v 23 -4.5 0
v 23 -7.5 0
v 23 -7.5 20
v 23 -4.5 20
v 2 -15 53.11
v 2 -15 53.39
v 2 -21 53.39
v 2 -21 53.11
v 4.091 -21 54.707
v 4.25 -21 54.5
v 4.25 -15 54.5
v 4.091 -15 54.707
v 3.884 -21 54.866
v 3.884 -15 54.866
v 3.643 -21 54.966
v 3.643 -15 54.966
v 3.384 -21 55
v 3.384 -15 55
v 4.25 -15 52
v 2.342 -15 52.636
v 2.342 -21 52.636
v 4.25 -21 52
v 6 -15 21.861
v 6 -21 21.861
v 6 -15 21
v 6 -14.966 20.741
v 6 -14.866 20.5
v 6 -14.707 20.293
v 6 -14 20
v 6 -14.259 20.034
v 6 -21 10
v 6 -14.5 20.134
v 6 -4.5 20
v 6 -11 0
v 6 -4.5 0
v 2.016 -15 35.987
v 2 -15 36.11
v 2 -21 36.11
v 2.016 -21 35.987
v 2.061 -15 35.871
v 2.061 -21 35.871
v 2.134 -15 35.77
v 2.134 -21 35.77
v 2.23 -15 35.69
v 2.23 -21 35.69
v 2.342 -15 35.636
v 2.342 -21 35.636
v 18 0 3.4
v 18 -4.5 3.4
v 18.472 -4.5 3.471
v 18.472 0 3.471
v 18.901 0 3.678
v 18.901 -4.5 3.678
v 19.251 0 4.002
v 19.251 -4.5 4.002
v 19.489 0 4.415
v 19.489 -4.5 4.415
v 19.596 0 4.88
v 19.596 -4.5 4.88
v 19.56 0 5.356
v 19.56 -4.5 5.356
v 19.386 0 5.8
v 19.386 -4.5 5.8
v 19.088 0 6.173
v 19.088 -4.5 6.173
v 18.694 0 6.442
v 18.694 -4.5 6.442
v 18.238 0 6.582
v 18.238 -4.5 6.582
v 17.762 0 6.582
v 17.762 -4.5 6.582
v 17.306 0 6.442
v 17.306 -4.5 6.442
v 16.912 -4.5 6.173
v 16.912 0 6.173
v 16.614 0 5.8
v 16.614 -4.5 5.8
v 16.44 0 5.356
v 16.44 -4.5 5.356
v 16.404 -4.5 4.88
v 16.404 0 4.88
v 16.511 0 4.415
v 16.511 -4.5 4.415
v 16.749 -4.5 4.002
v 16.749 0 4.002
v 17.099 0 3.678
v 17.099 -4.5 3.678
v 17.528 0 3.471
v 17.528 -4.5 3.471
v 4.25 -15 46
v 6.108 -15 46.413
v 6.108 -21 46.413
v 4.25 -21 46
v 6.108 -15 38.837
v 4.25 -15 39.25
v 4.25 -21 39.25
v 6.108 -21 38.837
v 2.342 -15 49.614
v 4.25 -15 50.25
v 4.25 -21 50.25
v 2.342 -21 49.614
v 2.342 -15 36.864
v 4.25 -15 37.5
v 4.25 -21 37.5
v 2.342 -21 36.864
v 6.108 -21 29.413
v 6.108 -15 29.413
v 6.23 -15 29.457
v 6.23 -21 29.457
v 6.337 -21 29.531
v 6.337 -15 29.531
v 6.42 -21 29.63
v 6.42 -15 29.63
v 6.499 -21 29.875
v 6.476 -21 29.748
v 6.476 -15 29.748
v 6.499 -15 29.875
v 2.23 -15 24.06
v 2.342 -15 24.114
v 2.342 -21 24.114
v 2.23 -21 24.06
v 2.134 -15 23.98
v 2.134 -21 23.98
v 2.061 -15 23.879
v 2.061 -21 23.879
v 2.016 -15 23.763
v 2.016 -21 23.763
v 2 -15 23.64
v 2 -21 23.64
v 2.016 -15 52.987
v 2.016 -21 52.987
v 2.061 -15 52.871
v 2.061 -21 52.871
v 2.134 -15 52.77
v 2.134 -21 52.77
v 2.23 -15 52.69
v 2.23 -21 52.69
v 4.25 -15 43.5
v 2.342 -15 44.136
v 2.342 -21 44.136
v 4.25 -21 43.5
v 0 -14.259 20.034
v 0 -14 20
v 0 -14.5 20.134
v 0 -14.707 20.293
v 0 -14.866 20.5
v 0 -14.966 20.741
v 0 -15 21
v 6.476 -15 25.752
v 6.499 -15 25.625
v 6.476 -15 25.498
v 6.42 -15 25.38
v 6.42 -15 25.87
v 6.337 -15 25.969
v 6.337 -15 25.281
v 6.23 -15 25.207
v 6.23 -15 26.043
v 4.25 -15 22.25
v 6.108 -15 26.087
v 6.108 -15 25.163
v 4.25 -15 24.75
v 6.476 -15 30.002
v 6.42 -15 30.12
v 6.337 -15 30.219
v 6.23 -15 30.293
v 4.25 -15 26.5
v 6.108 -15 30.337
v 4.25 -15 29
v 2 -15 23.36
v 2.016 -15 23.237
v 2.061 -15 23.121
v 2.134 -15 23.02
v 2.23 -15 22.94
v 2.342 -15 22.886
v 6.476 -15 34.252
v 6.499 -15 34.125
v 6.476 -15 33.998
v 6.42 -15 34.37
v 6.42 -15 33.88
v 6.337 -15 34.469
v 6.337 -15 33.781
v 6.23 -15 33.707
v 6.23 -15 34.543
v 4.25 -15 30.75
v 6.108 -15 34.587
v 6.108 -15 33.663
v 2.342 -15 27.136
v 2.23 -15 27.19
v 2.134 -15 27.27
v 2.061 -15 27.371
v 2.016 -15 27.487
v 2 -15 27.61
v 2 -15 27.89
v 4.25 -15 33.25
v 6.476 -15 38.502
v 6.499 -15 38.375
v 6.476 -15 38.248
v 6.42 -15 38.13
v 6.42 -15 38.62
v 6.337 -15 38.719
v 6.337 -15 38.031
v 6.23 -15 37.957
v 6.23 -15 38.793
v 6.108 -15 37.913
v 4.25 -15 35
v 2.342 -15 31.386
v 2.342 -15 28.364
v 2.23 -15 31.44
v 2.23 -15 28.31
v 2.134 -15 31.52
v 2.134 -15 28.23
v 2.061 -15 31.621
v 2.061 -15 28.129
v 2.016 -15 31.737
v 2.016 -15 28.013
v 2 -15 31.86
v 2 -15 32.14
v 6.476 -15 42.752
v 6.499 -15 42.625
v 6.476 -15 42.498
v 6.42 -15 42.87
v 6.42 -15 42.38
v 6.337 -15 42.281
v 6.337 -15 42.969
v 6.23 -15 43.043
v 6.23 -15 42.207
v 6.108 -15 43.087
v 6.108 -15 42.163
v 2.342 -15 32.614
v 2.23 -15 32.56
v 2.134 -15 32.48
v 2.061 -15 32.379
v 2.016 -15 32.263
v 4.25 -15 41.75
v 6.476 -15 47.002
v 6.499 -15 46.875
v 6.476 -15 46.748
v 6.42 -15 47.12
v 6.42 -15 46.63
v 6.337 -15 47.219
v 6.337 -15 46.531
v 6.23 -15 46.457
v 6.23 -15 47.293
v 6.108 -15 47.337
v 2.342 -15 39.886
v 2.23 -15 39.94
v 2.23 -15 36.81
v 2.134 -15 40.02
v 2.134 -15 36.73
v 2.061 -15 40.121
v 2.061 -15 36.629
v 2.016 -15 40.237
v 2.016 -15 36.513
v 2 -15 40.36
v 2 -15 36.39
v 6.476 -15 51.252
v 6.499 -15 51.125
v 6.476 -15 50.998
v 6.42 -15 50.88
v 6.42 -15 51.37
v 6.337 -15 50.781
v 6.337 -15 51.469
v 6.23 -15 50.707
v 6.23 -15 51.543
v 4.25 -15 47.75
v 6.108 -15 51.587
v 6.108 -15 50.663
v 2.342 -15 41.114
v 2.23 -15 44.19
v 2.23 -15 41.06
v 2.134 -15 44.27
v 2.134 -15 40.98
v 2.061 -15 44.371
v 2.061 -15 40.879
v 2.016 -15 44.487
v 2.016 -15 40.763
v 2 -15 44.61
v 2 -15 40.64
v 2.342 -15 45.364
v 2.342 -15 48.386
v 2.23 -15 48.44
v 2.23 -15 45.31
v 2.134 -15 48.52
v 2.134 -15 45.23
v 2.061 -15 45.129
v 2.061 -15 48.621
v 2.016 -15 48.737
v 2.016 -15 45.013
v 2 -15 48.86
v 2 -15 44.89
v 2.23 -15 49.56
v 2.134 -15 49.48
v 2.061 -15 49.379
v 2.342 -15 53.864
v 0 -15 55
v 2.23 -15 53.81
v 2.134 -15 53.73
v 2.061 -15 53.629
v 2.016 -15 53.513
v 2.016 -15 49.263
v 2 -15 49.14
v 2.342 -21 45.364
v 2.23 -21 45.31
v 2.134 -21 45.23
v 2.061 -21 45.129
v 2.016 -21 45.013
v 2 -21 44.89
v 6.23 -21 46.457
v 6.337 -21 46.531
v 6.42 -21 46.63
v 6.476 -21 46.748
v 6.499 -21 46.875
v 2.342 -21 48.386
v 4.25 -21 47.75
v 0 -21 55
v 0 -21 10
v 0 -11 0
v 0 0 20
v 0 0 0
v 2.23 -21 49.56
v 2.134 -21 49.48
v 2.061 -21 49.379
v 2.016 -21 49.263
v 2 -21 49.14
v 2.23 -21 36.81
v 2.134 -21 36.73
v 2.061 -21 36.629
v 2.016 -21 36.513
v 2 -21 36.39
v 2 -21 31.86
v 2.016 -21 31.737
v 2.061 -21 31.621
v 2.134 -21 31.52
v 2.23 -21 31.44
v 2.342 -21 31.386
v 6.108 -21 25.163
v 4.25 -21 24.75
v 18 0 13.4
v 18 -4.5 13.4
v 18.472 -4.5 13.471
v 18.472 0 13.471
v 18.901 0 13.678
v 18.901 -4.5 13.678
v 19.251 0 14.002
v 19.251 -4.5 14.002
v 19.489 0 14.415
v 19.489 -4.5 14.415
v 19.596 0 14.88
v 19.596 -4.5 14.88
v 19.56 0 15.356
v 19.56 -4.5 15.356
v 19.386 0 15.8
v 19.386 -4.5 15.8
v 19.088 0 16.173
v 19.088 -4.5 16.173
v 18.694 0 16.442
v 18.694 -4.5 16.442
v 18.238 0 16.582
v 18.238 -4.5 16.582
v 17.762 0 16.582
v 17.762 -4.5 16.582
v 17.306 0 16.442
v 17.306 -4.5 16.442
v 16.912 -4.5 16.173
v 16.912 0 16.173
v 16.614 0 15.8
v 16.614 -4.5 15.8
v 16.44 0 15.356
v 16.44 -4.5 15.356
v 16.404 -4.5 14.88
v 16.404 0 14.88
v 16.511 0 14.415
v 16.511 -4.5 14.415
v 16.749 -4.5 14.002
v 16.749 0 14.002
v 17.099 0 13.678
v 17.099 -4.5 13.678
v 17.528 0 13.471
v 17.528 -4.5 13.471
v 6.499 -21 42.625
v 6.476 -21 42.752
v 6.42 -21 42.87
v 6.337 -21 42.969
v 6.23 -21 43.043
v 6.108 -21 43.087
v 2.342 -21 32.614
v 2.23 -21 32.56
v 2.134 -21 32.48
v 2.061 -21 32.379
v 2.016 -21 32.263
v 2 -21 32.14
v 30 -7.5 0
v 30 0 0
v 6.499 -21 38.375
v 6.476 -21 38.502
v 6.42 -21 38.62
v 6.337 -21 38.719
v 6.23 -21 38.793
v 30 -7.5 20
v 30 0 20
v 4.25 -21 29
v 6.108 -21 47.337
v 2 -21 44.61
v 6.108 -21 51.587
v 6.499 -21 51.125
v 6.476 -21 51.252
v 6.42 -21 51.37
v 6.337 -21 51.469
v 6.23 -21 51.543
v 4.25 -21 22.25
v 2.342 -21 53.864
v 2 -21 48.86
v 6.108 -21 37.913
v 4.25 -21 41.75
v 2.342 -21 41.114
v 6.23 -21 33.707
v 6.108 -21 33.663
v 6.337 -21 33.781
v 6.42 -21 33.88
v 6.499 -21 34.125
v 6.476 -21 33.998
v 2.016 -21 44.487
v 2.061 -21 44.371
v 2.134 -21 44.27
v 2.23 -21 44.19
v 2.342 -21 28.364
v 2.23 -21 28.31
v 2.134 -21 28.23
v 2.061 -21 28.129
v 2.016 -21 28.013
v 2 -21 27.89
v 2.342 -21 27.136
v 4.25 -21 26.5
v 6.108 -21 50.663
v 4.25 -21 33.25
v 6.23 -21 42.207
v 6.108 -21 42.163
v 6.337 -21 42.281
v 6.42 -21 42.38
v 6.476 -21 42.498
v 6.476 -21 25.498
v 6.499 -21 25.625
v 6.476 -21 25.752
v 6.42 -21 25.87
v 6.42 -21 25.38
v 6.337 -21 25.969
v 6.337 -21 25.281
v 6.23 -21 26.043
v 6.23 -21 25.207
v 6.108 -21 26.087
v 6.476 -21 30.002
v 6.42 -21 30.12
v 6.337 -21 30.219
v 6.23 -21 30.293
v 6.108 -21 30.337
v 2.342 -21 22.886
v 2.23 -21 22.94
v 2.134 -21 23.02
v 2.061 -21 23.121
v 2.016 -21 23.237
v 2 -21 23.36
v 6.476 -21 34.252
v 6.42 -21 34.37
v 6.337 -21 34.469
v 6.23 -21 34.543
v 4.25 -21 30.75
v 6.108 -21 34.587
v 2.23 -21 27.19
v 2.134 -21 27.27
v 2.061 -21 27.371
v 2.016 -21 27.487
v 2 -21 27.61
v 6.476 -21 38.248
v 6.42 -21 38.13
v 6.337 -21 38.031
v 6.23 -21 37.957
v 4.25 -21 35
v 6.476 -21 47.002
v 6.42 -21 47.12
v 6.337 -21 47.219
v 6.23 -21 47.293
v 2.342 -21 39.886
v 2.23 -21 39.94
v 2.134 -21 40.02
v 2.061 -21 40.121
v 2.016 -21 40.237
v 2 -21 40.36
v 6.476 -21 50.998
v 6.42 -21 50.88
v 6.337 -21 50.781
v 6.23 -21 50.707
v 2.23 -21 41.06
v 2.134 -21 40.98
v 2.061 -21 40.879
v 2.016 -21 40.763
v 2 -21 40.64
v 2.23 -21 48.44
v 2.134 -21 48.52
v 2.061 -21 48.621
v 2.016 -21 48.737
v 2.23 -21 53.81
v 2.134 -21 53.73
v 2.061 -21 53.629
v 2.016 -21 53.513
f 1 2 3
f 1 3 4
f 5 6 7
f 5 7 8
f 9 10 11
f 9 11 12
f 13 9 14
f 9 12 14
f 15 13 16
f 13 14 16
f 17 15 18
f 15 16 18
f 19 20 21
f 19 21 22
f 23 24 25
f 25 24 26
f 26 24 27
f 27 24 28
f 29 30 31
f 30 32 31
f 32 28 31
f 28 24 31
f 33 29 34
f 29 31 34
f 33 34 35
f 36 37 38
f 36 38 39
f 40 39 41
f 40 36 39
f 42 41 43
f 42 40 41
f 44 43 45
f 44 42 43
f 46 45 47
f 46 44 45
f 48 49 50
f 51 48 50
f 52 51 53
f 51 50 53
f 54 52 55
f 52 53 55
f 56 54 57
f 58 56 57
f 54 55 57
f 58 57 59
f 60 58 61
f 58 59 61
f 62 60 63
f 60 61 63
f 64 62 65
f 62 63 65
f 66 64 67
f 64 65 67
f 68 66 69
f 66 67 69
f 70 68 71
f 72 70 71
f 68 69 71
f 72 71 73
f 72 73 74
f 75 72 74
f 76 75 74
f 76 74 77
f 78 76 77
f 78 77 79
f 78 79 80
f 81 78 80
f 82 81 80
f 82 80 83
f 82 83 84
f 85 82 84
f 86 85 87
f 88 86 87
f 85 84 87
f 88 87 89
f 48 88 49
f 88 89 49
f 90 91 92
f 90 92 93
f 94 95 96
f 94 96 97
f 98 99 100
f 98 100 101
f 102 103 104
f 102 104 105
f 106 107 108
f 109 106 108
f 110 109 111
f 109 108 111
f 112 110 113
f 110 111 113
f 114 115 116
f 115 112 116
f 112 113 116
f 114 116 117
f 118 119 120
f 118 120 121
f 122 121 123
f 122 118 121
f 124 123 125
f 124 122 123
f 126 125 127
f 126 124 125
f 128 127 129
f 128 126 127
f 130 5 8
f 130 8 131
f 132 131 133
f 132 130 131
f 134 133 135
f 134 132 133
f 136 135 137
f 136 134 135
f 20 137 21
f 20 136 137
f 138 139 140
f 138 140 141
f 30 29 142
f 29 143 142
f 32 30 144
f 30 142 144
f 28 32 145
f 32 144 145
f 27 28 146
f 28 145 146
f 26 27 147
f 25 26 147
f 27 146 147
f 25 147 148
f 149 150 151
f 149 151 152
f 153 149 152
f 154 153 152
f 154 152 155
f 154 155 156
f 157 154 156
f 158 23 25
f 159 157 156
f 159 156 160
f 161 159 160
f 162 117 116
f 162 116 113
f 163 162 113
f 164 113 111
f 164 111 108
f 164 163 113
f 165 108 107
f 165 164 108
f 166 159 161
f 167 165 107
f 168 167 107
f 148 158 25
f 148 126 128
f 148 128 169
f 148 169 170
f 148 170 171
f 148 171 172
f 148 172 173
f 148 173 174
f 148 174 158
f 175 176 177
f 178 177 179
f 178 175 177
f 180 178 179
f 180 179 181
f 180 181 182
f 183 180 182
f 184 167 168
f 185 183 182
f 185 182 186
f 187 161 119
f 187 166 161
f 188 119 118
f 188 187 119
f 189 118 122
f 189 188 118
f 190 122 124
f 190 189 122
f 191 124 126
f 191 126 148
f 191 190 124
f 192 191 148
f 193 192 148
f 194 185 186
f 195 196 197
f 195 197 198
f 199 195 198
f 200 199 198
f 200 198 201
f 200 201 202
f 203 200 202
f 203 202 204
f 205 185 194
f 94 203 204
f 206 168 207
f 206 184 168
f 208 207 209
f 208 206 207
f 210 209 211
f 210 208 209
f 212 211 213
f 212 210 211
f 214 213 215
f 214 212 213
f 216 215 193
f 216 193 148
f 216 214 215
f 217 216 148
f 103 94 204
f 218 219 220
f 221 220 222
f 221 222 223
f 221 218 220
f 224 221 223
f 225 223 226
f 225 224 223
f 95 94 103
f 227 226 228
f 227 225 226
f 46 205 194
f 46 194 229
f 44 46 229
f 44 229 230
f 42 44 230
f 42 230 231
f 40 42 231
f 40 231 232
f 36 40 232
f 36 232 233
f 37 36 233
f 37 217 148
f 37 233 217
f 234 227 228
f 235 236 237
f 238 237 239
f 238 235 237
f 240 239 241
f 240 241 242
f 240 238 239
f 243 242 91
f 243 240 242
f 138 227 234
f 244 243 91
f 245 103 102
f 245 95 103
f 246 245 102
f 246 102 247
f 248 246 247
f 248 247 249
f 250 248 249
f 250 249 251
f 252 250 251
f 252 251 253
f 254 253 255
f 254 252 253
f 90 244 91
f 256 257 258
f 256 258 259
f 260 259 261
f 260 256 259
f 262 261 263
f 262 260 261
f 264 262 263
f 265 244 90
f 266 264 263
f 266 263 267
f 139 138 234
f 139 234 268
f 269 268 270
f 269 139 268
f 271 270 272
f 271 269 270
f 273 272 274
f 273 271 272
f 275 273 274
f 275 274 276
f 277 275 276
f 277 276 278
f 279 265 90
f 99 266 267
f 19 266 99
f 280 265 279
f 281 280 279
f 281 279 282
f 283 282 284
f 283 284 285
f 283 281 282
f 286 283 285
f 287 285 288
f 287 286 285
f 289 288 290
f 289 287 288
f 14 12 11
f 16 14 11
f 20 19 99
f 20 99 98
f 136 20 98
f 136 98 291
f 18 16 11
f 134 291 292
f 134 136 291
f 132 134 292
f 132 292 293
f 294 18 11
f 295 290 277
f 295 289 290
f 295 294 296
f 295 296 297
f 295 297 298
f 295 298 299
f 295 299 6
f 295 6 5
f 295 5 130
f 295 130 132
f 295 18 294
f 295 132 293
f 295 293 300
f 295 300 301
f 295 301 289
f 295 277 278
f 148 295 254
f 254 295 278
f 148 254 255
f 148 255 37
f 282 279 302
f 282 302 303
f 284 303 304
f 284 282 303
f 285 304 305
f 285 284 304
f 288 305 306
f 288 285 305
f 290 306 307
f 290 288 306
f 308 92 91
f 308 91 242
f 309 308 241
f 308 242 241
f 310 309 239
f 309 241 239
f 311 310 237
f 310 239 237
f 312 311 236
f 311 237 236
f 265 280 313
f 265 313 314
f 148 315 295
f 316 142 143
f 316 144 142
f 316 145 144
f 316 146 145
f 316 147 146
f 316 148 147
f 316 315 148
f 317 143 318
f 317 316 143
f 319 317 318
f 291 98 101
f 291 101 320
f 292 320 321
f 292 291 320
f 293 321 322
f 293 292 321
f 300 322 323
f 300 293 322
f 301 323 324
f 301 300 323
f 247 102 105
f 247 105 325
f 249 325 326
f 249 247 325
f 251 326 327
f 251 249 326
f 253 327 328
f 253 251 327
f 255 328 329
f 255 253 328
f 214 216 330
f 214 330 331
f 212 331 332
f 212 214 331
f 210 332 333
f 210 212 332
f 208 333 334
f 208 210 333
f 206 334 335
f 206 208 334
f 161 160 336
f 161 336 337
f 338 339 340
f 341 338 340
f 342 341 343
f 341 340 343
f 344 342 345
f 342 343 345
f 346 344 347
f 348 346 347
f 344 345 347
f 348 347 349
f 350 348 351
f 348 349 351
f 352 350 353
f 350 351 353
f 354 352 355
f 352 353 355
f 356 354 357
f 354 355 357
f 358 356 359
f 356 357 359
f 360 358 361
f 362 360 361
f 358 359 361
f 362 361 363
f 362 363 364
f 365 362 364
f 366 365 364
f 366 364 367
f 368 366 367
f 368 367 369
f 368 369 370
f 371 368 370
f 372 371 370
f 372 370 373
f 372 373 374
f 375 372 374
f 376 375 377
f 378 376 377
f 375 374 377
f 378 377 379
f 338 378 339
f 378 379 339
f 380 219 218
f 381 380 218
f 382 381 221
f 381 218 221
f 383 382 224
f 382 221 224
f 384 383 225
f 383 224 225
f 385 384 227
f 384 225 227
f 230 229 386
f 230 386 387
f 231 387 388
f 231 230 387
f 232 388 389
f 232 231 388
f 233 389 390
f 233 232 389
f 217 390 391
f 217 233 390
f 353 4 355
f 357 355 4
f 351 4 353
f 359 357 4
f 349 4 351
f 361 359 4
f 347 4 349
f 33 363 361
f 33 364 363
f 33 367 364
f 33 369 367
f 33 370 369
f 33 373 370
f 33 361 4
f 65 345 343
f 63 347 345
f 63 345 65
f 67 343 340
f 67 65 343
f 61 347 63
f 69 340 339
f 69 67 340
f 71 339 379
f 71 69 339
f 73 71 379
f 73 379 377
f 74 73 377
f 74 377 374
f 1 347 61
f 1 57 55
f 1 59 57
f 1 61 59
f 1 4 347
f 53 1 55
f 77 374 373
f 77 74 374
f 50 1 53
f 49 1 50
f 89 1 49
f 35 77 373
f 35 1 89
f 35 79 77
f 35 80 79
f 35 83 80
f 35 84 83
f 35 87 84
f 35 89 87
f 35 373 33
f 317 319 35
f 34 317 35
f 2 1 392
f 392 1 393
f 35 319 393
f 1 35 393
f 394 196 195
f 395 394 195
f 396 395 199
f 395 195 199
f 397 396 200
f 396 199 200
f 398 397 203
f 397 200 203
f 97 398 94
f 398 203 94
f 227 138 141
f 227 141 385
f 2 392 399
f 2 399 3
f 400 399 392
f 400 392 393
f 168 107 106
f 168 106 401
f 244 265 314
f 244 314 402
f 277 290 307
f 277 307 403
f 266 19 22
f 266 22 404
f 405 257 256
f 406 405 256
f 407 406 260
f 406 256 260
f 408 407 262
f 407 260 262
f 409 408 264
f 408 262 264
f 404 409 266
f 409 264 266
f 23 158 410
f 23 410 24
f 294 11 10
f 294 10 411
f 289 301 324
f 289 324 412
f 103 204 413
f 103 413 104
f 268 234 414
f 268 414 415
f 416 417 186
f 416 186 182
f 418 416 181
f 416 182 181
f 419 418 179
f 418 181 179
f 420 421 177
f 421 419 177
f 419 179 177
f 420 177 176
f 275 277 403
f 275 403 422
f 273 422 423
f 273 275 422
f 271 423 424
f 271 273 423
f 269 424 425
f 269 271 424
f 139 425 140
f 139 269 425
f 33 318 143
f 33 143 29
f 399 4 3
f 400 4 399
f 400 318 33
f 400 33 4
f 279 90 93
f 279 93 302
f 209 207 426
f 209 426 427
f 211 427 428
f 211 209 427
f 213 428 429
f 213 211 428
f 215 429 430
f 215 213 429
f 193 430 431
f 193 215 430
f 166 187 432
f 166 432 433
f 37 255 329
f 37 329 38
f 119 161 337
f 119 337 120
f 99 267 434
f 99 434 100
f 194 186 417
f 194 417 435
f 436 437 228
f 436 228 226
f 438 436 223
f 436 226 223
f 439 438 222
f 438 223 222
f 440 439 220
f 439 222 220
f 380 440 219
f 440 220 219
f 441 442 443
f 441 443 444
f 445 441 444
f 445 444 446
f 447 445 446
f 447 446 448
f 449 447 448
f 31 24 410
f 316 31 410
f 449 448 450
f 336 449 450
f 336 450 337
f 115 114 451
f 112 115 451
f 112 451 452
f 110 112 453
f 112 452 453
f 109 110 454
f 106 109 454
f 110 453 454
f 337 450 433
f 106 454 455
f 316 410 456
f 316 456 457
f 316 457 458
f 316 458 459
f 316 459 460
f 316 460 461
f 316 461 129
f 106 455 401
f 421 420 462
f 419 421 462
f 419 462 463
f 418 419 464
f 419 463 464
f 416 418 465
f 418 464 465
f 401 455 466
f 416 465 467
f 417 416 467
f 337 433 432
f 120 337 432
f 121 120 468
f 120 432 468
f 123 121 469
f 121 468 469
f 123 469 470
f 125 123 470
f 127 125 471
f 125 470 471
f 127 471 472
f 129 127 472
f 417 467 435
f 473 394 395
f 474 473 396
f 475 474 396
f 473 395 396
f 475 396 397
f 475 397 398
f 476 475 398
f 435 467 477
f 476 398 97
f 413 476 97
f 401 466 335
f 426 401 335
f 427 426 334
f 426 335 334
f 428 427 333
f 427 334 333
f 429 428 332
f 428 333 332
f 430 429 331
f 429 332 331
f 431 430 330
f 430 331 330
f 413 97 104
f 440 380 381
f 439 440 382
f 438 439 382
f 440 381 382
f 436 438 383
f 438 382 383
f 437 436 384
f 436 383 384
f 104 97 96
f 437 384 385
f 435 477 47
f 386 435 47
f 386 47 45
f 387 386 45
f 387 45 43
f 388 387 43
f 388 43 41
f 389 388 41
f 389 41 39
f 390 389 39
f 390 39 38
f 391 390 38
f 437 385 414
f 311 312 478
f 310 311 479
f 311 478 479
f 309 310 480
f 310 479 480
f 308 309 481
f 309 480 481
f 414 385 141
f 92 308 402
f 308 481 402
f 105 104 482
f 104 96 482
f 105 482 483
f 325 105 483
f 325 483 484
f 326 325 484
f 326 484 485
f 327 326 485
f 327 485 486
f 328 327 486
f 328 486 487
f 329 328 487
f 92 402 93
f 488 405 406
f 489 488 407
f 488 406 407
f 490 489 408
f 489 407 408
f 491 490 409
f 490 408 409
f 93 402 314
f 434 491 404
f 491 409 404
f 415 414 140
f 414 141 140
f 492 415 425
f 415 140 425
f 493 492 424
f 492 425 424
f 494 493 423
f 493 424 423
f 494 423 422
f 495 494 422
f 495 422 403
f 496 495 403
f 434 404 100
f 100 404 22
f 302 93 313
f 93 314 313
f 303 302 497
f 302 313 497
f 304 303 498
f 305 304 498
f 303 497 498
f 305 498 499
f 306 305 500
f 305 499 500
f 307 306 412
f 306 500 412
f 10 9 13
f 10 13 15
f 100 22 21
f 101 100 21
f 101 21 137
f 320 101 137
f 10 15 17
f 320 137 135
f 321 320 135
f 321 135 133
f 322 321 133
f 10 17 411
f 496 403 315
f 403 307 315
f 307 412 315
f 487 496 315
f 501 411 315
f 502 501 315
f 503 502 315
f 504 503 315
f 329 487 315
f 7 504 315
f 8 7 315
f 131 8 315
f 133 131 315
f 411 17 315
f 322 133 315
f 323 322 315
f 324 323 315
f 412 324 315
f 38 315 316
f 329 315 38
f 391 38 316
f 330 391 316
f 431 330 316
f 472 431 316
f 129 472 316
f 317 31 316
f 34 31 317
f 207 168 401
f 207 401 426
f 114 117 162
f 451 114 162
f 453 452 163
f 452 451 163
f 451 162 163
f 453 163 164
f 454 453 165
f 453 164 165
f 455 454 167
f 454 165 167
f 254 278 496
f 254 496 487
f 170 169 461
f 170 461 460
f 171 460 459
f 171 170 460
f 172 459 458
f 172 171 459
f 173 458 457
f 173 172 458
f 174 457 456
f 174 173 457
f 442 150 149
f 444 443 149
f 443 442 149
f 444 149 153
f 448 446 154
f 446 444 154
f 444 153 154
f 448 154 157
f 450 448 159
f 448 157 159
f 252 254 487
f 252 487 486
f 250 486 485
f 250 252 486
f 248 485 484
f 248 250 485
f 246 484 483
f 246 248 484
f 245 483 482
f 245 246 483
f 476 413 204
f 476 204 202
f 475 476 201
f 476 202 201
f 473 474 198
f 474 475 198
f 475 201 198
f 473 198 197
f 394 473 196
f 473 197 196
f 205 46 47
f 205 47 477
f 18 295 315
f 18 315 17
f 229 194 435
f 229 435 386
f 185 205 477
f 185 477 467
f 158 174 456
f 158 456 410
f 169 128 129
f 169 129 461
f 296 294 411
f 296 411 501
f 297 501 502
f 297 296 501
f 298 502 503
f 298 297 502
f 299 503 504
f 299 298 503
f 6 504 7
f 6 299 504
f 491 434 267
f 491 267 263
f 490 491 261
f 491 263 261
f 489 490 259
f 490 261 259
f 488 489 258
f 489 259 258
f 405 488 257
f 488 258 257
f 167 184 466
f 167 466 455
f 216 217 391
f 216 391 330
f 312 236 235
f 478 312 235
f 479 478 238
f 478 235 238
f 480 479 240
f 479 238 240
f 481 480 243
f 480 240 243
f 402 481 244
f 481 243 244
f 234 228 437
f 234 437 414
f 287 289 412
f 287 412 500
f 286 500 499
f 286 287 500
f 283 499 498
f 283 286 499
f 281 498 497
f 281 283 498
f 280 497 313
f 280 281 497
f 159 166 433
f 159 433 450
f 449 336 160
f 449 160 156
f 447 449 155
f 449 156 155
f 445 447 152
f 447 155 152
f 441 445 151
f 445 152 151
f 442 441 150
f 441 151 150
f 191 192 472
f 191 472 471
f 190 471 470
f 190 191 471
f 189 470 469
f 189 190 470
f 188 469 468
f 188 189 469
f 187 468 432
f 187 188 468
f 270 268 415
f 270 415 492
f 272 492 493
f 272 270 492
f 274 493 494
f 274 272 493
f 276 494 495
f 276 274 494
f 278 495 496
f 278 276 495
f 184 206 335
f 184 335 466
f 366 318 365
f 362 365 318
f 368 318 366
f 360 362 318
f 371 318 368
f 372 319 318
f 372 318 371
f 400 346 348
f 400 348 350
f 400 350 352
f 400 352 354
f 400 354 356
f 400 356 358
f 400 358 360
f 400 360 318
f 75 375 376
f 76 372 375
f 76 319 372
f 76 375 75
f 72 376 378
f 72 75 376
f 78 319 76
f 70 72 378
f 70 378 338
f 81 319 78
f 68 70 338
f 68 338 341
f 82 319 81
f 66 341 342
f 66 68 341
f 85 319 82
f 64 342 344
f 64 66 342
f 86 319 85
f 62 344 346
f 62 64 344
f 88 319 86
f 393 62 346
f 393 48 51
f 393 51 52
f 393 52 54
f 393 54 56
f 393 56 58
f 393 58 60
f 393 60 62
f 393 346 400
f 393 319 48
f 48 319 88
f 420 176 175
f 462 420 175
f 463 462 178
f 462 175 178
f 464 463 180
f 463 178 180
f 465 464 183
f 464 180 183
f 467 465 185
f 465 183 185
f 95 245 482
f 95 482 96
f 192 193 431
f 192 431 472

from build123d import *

# Parameters (mm, degrees)
SKETCH1_W           = 30
SKETCH1_H           = 16
BOSS_EXTRUDE1_DEPTH = 20
CUT_EXTRUDE1_START  = -20
CUT_EXTRUDE1_DEPTH  = 20
SKETCH3_W           = 6
SKETCH3_H           = 10
BOSS_EXTRUDE2_DEPTH = 5
SKETCH9_R           = 1.6
CUT_EXTRUDE3_DEPTH  = 4.5
SKETCH11_W          = 8
SKETCH11_H          = 6
BOSS_EXTRUDE4_DEPTH = 40
FILLET1_R           = 1
CUT_EXTRUDE4_START  = -6
CUT_EXTRUDE4_DEPTH  = 6
SKETCH13_W          = 2
SKETCH13_H          = 6
BOSS_EXTRUDE5_DEPTH = 10
LPATTERN1_COUNT     = 8
LPATTERN1_PITCH     = 4.25
FILLET2_R           = 0.5
FILLET3_R           = 1
SKETCH14_W          = 2
SKETCH14_H          = 6
CUT_EXTRUDE5_DEPTH  = 17
CHAMFER9_SIZE       = 5


# Read off the part's stored shape, not the designer's step: Cut-Extrude1, Cut-Extrude4
with BuildPart() as part:
    # Sketch1 → Boss-Extrude1 (new body)
    with BuildSketch(Plane.XY):
        with Locations((15, -8)):
            Rectangle(SKETCH1_W, SKETCH1_H)
    extrude(amount=BOSS_EXTRUDE1_DEPTH)

    # Cut-Extrude1 outline → Cut-Extrude1 (cut)
    with BuildSketch(Plane.XY.offset(20).offset(CUT_EXTRUDE1_START)):
        Polygon((6, -4.5), (6, -16), (30, -16), (30, -7.5), (23, -7.5), (23, -4.5), align=None)
    extrude(amount=CUT_EXTRUDE1_DEPTH, mode=Mode.SUBTRACT)

    # Sketch3 → Boss-Extrude2 (add)
    with BuildSketch(Plane.XZ.offset(16)):
        with Locations((3, 10)):
            Rectangle(SKETCH3_W, SKETCH3_H)
    extrude(amount=BOSS_EXTRUDE2_DEPTH)

    # Sketch9 → Cut-Extrude3 (cut)
    with BuildSketch(Plane.XZ.offset(4.5)):
        with Locations(Location((18, 15, 0), (0, 0, 270))):
            Circle(SKETCH9_R)
        with Locations(Location((18, 5, 0), (0, 0, 270))):
            Circle(SKETCH9_R)
    extrude(amount=-CUT_EXTRUDE3_DEPTH, mode=Mode.SUBTRACT)

    # Sketch11 → Boss-Extrude4 (add)
    with BuildSketch(Plane.XY.offset(15)):
        with Locations((4, -18)):
            Rectangle(SKETCH11_W, SKETCH11_H)
    extrude(amount=BOSS_EXTRUDE4_DEPTH)

    # Fillet1
    fillet1_edges = [part.edges().sort_by_distance(p)[0] for p in [
        (3, -15, 20),
    ]]
    fillet(fillet1_edges, radius=FILLET1_R)

    # Cut-Extrude4 outline → Cut-Extrude4 (cut)
    with BuildSketch(Plane.XZ.offset(21).offset(CUT_EXTRUDE4_START)):
        Polygon((6.5, 51.5), (6.5, 50.75), (8, 50.75), (8, 55), (6.5, 55), (4.25, 54.5), (2, 53.75), (2, 52.75), (4.25, 52), align=None)
    cut_extrude4 = extrude(amount=CUT_EXTRUDE4_DEPTH, mode=Mode.SUBTRACT)

    # Sketch13 → Boss-Extrude5 (add)
    with BuildSketch(Plane(origin=(0, 0, 15), x_dir=(-1, 0, 0), z_dir=(0, 0, -1))):
        with Locations((-7, -18)):
            Rectangle(SKETCH13_W, SKETCH13_H)
    extrude(amount=BOSS_EXTRUDE5_DEPTH)

    # LPattern1: Cut-Extrude4 ×8
    with Locations(*[(0, 0, -i * LPATTERN1_PITCH) for i in range(1, LPATTERN1_COUNT)]):
        add(cut_extrude4, mode=Mode.SUBTRACT)

    # Fillet2
    # the kernel refuses this fillet: 0.5 mm, written as the material it adds along each edge
    with BuildSketch(Plane(origin=(2, -15, 52.75), x_dir=(0.9486832980505131, 0, -0.3162277660168398), z_dir=(0, -1, 0)), Plane(origin=(2, -15, 53.75), x_dir=(0, 0, -1), z_dir=(0, -1, 0)), Plane(origin=(2, -15, 48.5), x_dir=(0.9486832980505137, 0, -0.3162277660168381), z_dir=(0, -1, 0)), Plane(origin=(2, -15, 49.5), x_dir=(0, 0, -1), z_dir=(0, -1, 0)), Plane(origin=(2, -15, 44.25), x_dir=(0.9486832980505137, 0, -0.3162277660168381), z_dir=(0, -1, 0)), Plane(origin=(2, -15, 35.75), x_dir=(0.948683298050514, 0, -0.316227766016837), z_dir=(0, -1, 0)), Plane(origin=(2, -15, 36.75), x_dir=(0, 0, -1), z_dir=(0, -1, 0)), Plane(origin=(2, -15, 40), x_dir=(0.9486832980505137, 0, -0.31622776601683833), z_dir=(0, -1, 0)), Plane(origin=(2, -15, 41), x_dir=(0, 0, -1), z_dir=(0, -1, 0)), Plane(origin=(2, -15, 23), x_dir=(0.9486832980505137, 0, -0.31622776601683833), z_dir=(0, -1, 0)), Plane(origin=(2, -15, 24), x_dir=(0, 0, -1), z_dir=(0, -1, 0)), Plane(origin=(2, -15, 27.25), x_dir=(0.9486832980505135, 0, -0.3162277660168391), z_dir=(0, -1, 0)), Plane(origin=(2, -15, 28.25), x_dir=(0, 0, -1), z_dir=(0, -1, 0)), Plane(origin=(2, -15, 32.5), x_dir=(0, 0, -1), z_dir=(0, -1, 0)), Plane(origin=(2, -15, 31.5), x_dir=(0.9486832980505139, 0, -0.3162277660168378), z_dir=(0, -1, 0))) as fillet2_piece_1:
        with BuildLine():
            CenterArc((FILLET2_R * 0.720759220056, FILLET2_R), FILLET2_R, 198.434948823, 71.565051177)
            Line((-FILLET2_R * 0.227924077994, FILLET2_R * 0.683772233983), (0, 0))
            Line((0, 0), (FILLET2_R * 0.720759220056, 0))
        make_face()
    extrude(amount=6)
    with BuildSketch(Plane(origin=(2, -15, 45.25), x_dir=(0.948683298050513, 0, 0.31622776601684033), z_dir=(0, -1, 0))) as fillet2_piece_2:
        with BuildLine():
            CenterArc((FILLET2_R * 0.720759220056, -FILLET2_R), FILLET2_R, 90, 71.565051177)
            Line((-FILLET2_R * 0.227924077994, -FILLET2_R * 0.683772233983), (0, 0))
            Line((0, 0), (FILLET2_R * 0.720759220056, 0))
        make_face()
    extrude(amount=6)
    # the kernel refuses this fillet: 0.5 mm, written as the material it takes off along each edge
    with BuildSketch(Plane(origin=(6.5, -13.997285492, 33.75), x_dir=(-0.9761870601839541, 0, -0.21693045781865056), z_dir=(0, -1, 0)), Plane(origin=(6.5, -13.997285492, 34.5), x_dir=(0, 0, -1), z_dir=(0, -1, 0)), Plane(origin=(6.5, -13.997285492, 38), x_dir=(-0.9761870601839538, 0, -0.216930457818651), z_dir=(0, -1, 0)), Plane(origin=(6.5, -13.997285492, 38.75), x_dir=(0, 0, -1), z_dir=(0, -1, 0)), Plane(origin=(6.5, -13.997285492, 42.25), x_dir=(-0.9761870601839541, 0, -0.21693045781865006), z_dir=(0, -1, 0)), Plane(origin=(6.5, -13.997285492, 43), x_dir=(0, 0, -1), z_dir=(0, -1, 0)), Plane(origin=(6.5, -13.997285492, 46.5), x_dir=(-0.9761870601839537, 0, -0.21693045781865147), z_dir=(0, -1, 0)), Plane(origin=(6.5, -13.997285492, 47.25), x_dir=(0, 0, -1), z_dir=(0, -1, 0)), Plane(origin=(6.5, -13.997285492, 50.75), x_dir=(-0.9761870601839537, 0, -0.21693045781865147), z_dir=(0, -1, 0)), Plane(origin=(6.5, -13.997285492, 51.5), x_dir=(0, 0, -1), z_dir=(0, -1, 0)), Plane(origin=(6.5, -13.997285492, 25.25), x_dir=(-0.9761870601839521, 0, -0.21693045781865947), z_dir=(0, -1, 0)), Plane(origin=(6.5, -13.997285492, 26), x_dir=(0, 0, -1), z_dir=(0, -1, 0)), Plane(origin=(6.5, -13.997285492, 29.5), x_dir=(-0.9761870601839522, 0, -0.2169304578186585), z_dir=(0, -1, 0)), Plane(origin=(6.5, -13.997285492, 30.25), x_dir=(0, 0, -1), z_dir=(0, -1, 0))) as fillet2_2_piece_1:
        with BuildLine():
            CenterArc((FILLET2_R * 0.802171606366, -FILLET2_R), FILLET2_R, 90, 77.471192291)
            Line((-FILLET2_R * 0.174015453818, -FILLET2_R * 0.783069542181), (0, 0))
            Line((0, 0), (FILLET2_R * 0.802171606366, 0))
        make_face()
    extrude(amount=8.005429016, mode=Mode.SUBTRACT)

    # Fillet3
    # the kernel refuses this fillet: 1 mm, written as the material it takes off along each edge
    with BuildSketch(Plane(origin=(6.5, -7.209936491, 55), x_dir=(-0.9761870601839528, 0, -0.21693045781865575), z_dir=(0, -1, 0))) as fillet3_piece_1:
        with BuildLine():
            CenterArc((3.258754136, 0.300226243), FILLET3_R, 197.471192291, 60)
            Line((3.041823678, -0.675960817), (0, 0))
            Line((0, 0), (2.304886114, 0))
        make_face()
    extrude(amount=21.580127019, mode=Mode.SUBTRACT)

    # Sketch14 → Cut-Extrude5 (cut)
    with BuildSketch(Plane(origin=(0, 0, 5), x_dir=(-1, 0, 0), z_dir=(0, 0, -1))):
        with Locations((-7, -18)):
            Rectangle(SKETCH14_W, SKETCH14_H)
    extrude(amount=-CUT_EXTRUDE5_DEPTH, mode=Mode.SUBTRACT)

    # Chamfer9
    # the kernel refuses this chamfer: 5 mm, written as the material it adds along each edge
    # the kernel refuses this chamfer: 5 mm, written as the material it takes off along each edge
    with BuildSketch(Plane(origin=(18.85841494, -21, 5), x_dir=(0, -0.027495876610586393, 0.9996219169112968), z_dir=(-1, 0, 0))) as chamfer9_2_piece_1:
        Polygon((CHAMFER9_SIZE * 0.999621916911, CHAMFER9_SIZE * 0.0274958766106), (-CHAMFER9_SIZE * 0.0274958766106, CHAMFER9_SIZE * 0.999621916911), (0, 0), align=None)
    extrude(amount=31.71682988, mode=Mode.SUBTRACT)
    with BuildSketch(Plane(origin=(18.85841494, -16, 0), x_dir=(0, 0.9996219169112968, -0.027495876610586372), z_dir=(-1, 0, 0))) as chamfer9_2_piece_2:
        Polygon((CHAMFER9_SIZE * 0.999621916911, -CHAMFER9_SIZE * 0.0274958766106), (-CHAMFER9_SIZE * 0.0274958766106, -CHAMFER9_SIZE * 0.999621916911), (0, 0), align=None)
    extrude(amount=31.71682988, mode=Mode.SUBTRACT)


solid = part.part
